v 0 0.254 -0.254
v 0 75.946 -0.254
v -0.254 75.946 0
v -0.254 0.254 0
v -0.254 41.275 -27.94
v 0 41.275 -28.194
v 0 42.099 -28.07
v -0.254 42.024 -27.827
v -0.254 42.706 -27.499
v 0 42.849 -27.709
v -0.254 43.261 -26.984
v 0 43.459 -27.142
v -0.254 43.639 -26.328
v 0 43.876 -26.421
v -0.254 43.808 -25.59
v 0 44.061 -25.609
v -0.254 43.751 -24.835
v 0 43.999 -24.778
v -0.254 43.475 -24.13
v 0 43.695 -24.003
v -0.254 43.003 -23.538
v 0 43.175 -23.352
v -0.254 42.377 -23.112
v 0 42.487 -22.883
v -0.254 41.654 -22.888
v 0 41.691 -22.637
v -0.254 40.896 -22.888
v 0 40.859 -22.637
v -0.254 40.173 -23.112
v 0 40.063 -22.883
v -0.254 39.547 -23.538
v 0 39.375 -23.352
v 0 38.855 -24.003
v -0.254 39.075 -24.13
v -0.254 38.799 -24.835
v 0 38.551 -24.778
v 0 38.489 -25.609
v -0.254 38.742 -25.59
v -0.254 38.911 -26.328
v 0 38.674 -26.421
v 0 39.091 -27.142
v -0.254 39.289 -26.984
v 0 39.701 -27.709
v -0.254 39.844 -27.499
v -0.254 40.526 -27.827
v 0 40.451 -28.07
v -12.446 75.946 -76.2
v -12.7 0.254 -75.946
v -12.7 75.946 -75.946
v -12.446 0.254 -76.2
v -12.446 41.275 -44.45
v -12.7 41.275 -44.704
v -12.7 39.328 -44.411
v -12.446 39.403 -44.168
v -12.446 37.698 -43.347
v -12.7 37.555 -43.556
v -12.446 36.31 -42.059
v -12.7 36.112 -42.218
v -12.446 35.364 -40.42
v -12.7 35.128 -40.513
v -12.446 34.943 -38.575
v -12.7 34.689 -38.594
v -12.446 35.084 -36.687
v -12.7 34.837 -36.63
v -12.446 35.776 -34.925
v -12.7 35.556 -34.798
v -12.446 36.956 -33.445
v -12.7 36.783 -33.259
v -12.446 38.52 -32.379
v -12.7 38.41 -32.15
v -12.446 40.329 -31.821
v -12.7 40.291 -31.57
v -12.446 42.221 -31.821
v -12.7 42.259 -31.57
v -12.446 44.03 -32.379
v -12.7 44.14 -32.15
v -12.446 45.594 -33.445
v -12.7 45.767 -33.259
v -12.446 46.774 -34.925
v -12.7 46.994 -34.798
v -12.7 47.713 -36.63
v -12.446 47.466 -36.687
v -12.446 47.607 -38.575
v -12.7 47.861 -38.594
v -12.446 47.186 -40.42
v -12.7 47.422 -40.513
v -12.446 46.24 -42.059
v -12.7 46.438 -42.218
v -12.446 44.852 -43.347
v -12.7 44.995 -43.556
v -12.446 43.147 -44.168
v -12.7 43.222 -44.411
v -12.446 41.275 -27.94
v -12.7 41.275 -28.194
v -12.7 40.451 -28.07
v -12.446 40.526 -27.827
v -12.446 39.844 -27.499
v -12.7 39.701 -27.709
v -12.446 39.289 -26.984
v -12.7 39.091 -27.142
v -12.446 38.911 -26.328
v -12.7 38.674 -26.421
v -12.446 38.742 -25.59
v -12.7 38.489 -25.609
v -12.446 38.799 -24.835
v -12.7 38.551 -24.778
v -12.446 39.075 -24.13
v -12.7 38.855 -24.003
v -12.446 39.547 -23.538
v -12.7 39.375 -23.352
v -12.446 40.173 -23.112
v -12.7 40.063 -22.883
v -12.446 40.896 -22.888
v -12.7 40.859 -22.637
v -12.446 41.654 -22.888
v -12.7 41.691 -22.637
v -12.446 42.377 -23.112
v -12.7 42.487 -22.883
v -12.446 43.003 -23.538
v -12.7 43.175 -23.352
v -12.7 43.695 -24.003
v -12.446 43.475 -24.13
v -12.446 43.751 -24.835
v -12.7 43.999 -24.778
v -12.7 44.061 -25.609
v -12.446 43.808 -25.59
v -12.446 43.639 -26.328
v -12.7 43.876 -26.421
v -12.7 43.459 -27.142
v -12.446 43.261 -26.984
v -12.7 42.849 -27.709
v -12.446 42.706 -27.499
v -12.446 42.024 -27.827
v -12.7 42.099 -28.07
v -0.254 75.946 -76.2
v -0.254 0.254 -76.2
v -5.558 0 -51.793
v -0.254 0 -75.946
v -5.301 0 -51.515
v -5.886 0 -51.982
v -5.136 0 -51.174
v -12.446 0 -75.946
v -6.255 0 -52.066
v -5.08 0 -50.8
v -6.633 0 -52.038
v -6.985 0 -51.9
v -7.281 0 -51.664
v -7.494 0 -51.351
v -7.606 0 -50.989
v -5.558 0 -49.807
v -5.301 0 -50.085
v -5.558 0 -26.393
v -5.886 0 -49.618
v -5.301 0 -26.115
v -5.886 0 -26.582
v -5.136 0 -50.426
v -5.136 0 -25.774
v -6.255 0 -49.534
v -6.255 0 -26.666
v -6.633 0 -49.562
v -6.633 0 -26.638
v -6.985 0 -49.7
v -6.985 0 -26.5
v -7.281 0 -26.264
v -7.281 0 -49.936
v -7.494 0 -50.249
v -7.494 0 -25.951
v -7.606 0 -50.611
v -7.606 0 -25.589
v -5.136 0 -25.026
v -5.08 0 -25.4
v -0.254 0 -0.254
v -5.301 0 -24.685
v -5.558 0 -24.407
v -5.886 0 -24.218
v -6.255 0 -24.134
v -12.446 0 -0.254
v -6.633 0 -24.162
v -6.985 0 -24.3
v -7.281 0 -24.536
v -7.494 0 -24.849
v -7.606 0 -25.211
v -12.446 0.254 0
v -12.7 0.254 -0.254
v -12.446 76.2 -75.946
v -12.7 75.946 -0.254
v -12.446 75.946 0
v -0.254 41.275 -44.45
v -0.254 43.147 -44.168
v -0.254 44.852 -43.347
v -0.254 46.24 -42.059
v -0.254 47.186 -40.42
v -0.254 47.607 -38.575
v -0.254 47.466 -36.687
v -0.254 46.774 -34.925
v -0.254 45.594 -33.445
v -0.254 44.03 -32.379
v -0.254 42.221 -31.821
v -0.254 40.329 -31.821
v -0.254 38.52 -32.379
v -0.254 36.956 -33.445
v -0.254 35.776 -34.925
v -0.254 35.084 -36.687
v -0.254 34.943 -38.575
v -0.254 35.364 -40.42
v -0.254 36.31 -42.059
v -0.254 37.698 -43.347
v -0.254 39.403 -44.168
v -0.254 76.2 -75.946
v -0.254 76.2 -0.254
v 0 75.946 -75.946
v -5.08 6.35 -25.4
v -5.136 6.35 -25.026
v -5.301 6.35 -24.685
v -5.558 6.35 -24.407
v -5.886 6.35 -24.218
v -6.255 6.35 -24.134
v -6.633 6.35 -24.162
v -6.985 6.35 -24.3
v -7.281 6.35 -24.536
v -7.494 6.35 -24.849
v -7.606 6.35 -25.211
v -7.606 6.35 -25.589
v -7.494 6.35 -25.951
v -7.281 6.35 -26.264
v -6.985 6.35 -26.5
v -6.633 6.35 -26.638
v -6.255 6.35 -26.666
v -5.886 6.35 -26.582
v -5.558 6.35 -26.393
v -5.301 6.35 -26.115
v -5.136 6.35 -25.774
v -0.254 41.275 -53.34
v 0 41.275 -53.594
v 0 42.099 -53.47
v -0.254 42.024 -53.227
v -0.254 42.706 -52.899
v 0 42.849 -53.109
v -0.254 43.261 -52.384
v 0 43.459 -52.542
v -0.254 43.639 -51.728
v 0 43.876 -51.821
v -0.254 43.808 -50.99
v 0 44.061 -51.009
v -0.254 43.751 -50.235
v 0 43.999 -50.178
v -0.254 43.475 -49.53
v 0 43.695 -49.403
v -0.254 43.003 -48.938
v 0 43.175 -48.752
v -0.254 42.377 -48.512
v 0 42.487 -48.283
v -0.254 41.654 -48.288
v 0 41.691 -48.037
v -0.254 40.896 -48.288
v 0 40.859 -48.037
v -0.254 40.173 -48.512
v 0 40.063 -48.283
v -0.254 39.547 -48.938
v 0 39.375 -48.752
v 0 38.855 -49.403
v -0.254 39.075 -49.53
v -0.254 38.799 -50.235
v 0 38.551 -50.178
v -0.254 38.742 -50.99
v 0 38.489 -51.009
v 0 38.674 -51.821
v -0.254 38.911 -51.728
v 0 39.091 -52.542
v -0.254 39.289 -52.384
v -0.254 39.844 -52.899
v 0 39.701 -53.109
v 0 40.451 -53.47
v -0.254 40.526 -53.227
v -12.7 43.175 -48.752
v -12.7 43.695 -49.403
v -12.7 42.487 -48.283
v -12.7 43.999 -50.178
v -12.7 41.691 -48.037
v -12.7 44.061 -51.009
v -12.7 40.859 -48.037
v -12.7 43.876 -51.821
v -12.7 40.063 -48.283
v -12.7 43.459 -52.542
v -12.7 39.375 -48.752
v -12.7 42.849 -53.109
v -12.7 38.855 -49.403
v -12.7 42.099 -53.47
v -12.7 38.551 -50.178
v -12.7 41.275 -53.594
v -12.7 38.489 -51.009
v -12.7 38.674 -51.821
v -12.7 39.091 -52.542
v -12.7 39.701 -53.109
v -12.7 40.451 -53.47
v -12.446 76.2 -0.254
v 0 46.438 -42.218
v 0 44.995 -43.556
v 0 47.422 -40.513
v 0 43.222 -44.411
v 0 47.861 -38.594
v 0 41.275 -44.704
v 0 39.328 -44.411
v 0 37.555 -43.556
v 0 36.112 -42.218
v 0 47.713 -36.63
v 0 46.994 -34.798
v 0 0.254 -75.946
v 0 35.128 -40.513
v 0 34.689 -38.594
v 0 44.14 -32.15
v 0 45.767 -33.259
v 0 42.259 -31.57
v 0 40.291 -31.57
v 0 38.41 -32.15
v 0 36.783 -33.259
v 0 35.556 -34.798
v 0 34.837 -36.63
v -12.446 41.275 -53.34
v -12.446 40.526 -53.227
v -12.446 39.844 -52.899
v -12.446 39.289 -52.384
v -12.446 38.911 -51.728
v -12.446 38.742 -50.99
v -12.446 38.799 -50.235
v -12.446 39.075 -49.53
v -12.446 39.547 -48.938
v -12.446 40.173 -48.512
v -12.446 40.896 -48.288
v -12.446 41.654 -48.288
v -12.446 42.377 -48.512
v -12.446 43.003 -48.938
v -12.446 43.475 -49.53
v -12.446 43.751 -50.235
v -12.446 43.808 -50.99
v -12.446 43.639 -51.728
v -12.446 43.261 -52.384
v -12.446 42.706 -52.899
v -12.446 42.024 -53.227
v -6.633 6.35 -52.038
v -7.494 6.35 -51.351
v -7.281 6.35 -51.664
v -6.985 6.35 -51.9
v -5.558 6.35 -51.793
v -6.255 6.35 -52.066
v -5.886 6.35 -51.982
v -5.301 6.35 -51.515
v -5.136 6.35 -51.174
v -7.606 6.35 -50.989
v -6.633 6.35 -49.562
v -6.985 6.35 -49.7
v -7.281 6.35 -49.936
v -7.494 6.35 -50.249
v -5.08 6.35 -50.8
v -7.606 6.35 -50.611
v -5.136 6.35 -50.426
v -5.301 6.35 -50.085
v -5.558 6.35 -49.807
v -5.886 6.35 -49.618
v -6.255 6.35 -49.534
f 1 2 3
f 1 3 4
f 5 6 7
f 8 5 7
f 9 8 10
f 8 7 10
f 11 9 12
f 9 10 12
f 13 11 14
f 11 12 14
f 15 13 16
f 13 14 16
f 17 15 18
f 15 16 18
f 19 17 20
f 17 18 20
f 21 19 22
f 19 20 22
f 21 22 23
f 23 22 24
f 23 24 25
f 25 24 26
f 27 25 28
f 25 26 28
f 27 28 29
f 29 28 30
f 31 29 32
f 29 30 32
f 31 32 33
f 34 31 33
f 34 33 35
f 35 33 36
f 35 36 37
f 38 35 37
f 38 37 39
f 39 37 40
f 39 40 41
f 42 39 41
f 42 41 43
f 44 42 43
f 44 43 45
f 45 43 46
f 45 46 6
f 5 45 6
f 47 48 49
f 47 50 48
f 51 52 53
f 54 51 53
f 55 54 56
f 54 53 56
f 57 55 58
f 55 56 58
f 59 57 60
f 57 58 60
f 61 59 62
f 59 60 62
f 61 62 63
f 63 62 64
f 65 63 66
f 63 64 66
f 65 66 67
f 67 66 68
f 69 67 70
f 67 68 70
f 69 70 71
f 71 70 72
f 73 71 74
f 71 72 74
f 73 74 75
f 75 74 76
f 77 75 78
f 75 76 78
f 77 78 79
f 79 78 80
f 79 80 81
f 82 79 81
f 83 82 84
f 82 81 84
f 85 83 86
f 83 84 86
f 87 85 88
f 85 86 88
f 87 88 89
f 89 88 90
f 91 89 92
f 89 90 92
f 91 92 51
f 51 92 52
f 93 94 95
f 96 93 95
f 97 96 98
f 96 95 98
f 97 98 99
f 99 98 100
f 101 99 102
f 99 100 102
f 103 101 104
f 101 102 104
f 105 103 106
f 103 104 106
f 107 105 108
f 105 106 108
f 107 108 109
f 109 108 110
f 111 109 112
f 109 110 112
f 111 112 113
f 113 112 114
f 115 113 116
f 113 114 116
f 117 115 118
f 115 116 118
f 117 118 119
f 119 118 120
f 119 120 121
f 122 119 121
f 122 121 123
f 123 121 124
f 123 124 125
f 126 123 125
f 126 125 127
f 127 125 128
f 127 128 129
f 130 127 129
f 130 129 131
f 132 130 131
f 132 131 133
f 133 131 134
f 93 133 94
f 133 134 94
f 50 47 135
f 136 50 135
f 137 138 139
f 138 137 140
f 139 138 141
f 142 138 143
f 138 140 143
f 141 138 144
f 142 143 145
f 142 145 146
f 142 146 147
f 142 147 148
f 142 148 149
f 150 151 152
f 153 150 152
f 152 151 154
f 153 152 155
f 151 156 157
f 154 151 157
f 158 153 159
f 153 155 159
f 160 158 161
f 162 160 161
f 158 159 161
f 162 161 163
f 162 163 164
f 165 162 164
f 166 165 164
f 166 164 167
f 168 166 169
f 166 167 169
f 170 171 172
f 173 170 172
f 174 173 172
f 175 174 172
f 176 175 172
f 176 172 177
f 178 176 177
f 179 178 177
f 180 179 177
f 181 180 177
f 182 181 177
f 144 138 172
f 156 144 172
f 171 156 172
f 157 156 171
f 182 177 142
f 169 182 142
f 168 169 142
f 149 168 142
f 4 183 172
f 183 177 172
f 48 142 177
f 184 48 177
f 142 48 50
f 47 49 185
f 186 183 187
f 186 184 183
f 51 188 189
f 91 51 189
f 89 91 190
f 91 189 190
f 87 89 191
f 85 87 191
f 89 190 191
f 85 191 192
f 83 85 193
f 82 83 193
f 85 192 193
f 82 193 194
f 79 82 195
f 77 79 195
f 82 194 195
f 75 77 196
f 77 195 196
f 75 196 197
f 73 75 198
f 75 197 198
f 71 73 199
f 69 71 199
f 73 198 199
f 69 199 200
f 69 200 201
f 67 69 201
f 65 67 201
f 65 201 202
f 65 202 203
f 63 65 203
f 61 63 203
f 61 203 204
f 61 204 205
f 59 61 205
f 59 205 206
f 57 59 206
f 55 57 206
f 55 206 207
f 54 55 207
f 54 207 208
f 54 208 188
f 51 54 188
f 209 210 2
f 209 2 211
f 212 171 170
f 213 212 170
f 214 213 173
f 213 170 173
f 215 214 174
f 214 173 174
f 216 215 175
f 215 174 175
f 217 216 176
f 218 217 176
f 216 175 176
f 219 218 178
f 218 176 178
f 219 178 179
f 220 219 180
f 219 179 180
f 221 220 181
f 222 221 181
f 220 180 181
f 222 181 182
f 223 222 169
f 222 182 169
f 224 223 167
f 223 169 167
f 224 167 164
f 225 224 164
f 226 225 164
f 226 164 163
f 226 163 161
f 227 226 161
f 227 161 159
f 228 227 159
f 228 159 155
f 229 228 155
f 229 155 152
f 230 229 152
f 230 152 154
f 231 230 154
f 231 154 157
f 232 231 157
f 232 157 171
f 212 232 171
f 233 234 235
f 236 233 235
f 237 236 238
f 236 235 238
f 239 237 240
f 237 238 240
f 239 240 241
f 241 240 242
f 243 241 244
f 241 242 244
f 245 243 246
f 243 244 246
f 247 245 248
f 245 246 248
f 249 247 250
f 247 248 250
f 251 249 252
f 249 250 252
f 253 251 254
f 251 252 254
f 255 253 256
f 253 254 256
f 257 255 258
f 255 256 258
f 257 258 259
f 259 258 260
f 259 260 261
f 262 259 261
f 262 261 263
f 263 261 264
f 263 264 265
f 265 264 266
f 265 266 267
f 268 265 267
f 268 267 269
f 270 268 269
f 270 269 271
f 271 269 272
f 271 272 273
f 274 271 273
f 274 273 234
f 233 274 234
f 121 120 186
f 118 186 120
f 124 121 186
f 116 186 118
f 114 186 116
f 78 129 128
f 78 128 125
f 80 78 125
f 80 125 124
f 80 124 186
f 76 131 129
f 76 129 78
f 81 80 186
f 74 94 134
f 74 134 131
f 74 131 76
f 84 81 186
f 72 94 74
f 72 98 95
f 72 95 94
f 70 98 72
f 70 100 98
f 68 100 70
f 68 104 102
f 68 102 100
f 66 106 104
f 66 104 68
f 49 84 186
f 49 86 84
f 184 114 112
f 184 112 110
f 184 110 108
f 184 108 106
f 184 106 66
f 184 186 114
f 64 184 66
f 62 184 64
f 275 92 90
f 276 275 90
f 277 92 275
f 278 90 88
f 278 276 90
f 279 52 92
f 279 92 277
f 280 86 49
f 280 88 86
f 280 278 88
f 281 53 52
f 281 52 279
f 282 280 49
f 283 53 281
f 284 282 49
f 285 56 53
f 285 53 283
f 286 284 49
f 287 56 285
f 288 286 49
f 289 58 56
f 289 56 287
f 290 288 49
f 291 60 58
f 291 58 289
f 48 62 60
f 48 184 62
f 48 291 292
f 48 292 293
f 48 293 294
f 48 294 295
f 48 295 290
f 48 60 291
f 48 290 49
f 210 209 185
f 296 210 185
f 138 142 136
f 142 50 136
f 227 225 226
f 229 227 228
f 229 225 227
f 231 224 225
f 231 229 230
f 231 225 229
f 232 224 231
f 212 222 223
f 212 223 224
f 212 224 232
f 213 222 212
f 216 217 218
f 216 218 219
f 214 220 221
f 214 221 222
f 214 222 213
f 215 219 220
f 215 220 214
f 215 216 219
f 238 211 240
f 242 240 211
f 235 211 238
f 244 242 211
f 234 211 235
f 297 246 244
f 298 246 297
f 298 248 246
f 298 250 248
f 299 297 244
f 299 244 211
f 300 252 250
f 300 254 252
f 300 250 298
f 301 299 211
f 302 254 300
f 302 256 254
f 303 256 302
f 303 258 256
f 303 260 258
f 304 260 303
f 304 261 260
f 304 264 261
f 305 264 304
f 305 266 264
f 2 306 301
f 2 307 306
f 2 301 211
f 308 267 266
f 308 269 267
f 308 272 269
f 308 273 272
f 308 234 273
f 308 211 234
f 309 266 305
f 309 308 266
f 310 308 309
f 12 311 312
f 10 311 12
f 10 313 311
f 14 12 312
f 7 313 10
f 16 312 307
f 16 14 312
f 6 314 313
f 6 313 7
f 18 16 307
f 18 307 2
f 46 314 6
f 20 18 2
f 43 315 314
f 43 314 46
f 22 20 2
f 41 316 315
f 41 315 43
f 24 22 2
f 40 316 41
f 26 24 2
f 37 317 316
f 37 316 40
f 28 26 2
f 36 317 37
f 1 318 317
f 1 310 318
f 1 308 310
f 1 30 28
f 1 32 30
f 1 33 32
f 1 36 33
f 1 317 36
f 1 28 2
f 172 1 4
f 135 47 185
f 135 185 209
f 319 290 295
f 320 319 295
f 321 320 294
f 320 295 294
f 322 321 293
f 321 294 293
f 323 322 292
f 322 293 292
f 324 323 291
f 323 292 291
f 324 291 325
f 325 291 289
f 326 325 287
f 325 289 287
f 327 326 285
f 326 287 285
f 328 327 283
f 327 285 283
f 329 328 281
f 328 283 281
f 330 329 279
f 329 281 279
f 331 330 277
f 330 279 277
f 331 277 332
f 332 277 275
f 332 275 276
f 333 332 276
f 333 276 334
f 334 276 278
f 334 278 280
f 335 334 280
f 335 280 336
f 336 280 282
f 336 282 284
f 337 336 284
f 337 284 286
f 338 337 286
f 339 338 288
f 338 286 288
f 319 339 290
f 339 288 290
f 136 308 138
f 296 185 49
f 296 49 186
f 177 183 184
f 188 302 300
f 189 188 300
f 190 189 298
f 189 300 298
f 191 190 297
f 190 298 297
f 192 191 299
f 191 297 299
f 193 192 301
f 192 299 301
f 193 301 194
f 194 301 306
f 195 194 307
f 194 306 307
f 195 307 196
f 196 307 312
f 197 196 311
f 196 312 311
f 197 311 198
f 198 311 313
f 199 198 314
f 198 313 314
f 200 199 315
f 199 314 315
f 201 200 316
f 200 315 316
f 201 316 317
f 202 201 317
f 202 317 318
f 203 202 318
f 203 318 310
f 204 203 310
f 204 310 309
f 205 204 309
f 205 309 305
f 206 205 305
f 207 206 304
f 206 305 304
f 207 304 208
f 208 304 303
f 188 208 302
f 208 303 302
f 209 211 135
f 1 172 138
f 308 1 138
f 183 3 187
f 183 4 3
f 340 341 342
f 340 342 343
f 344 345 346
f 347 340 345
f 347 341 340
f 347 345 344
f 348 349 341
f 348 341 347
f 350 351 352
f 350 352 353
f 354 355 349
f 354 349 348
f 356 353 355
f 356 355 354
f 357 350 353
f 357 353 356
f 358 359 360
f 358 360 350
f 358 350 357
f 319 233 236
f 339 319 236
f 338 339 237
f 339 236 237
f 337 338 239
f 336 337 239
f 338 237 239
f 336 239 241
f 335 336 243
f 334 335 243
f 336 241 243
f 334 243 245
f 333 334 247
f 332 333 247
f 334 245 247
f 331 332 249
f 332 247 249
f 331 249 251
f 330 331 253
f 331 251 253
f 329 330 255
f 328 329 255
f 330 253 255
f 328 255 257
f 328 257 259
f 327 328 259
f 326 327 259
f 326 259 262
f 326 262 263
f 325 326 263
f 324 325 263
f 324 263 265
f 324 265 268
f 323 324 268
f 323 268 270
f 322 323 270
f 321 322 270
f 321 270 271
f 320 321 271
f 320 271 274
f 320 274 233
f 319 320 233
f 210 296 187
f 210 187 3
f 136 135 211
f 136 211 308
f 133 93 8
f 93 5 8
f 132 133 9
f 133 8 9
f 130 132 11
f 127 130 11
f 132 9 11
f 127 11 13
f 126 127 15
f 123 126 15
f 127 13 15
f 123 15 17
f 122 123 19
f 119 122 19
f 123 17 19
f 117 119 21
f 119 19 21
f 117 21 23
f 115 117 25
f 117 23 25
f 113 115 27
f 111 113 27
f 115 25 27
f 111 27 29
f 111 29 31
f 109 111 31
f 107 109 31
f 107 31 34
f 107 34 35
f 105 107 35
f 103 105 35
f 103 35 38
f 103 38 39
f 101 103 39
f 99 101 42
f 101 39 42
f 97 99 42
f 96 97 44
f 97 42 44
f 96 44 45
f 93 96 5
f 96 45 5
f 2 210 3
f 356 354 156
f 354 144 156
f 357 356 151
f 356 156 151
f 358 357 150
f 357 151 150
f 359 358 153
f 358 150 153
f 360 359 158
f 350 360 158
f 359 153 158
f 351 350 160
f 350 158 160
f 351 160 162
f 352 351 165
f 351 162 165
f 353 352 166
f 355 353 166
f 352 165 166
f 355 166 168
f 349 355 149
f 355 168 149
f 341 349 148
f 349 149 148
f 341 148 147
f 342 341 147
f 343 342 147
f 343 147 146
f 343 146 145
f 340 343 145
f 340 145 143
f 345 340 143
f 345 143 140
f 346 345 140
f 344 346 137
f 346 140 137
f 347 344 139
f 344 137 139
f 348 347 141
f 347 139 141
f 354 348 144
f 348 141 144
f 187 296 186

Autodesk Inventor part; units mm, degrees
ref_plane "YZ Plane" through (0, 0, 0) normal (1, 0, 0) x (0, 1, 0)
ref_plane "XZ Plane" through (0, 0, 0) normal (0, 1, 0) x (-1, 0, 0)
ref_plane "XY Plane" through (0, 0, 0) normal (0, 0, 1) x (1, 0, 0)
sketch "Sketch1" plane through (0, 0, 0) normal (0, 1, 0) x (-1, 0, 0)
  line L0 (0, 0) -> (12.7, 0)
  line L1 (12.7, 0) -> (12.7, -76.2)
  line L2 (12.7, -76.2) -> (0, -76.2)
  line L3 (0, -76.2) -> (0, 0)
  dimension "d0" = 12.7
  dimension "d1" = 76.2
extrude "Extrusion1" add sketch "Sketch1" along normal blind 76.2
sketch "Sketch2" plane through (0, 0, 0) normal (0, -1, 0) x (1, 0, 0)
  circle A0 centre (-6.35, -25.4) radius 1.27
  circle A1 centre (-6.35, -50.8) radius 1.27
  line L0 (0, 0) -> (-12.7, 0) projected
  line L1 (-12.7, -76.2) -> (0, -76.2) projected
  dimension "d4" = 2.54
  dimension "d5" = 2.54
  dimension "d6" = 25.4
  dimension "d8" = 25.4
  dimension "d9" = 6.35
extrude "Extrusion2" cut sketch "Sketch2" against normal blind 6.35
sketch "Sketch3" plane through (0, 0, 0) normal (1, 0, 0) x (0, 0, -1)
  circle A0 centre (38.1, 41.275) radius 6.35
  circle A1 centre (25.4, 41.275) radius 2.54
  line L0 (0, 0) -> (0, 76.2) projected
  circle A2 centre (50.8, 41.275) radius 2.54
  line L1 (76.2, 0) -> (0, 0) projected
  dimension "d12" = 12.7
  dimension "d13" = 5.08
  dimension "d15" = 38.1
  dimension "d16" = 25.4
  dimension "d19" = 360
  dimension "d21" = 41.275
extrude "Extrusion3" cut sketch "Sketch3" against normal up to next
thread "Thread1" size "12-24 UNC" class "2B" standard "ANSI Unified Screw Threads" full length
thread "Thread2" size "12-24 UNC" class "2B" standard "ANSI Unified Screw Threads" full length
chamfer "Chamfer1" distance 0.254 angle 45 18 edges at (0, 41.275, -31.75) (0, 41.275, -22.86) (0, 41.275, -48.26) (-12.7, 41.275, -48.26) (-12.7, 41.275, -31.75) (-12.7, 41.275, -22.86) (0, 76.2, -38.1) (-6.35, 76.2, 0) (-12.7, 76.2, -38.1) (0, 38.1, 0) (-12.7, 38.1, 0) (0, 38.1, -76.2) (0, 0, -38.1) (-6.35, 0, 0) (-12.7, 38.1, -76.2) (-12.7, 0, -38.1) (-6.35, 76.2, -76.2) (-6.35, 0, -76.2)
properties part number "Fixture-Center"
